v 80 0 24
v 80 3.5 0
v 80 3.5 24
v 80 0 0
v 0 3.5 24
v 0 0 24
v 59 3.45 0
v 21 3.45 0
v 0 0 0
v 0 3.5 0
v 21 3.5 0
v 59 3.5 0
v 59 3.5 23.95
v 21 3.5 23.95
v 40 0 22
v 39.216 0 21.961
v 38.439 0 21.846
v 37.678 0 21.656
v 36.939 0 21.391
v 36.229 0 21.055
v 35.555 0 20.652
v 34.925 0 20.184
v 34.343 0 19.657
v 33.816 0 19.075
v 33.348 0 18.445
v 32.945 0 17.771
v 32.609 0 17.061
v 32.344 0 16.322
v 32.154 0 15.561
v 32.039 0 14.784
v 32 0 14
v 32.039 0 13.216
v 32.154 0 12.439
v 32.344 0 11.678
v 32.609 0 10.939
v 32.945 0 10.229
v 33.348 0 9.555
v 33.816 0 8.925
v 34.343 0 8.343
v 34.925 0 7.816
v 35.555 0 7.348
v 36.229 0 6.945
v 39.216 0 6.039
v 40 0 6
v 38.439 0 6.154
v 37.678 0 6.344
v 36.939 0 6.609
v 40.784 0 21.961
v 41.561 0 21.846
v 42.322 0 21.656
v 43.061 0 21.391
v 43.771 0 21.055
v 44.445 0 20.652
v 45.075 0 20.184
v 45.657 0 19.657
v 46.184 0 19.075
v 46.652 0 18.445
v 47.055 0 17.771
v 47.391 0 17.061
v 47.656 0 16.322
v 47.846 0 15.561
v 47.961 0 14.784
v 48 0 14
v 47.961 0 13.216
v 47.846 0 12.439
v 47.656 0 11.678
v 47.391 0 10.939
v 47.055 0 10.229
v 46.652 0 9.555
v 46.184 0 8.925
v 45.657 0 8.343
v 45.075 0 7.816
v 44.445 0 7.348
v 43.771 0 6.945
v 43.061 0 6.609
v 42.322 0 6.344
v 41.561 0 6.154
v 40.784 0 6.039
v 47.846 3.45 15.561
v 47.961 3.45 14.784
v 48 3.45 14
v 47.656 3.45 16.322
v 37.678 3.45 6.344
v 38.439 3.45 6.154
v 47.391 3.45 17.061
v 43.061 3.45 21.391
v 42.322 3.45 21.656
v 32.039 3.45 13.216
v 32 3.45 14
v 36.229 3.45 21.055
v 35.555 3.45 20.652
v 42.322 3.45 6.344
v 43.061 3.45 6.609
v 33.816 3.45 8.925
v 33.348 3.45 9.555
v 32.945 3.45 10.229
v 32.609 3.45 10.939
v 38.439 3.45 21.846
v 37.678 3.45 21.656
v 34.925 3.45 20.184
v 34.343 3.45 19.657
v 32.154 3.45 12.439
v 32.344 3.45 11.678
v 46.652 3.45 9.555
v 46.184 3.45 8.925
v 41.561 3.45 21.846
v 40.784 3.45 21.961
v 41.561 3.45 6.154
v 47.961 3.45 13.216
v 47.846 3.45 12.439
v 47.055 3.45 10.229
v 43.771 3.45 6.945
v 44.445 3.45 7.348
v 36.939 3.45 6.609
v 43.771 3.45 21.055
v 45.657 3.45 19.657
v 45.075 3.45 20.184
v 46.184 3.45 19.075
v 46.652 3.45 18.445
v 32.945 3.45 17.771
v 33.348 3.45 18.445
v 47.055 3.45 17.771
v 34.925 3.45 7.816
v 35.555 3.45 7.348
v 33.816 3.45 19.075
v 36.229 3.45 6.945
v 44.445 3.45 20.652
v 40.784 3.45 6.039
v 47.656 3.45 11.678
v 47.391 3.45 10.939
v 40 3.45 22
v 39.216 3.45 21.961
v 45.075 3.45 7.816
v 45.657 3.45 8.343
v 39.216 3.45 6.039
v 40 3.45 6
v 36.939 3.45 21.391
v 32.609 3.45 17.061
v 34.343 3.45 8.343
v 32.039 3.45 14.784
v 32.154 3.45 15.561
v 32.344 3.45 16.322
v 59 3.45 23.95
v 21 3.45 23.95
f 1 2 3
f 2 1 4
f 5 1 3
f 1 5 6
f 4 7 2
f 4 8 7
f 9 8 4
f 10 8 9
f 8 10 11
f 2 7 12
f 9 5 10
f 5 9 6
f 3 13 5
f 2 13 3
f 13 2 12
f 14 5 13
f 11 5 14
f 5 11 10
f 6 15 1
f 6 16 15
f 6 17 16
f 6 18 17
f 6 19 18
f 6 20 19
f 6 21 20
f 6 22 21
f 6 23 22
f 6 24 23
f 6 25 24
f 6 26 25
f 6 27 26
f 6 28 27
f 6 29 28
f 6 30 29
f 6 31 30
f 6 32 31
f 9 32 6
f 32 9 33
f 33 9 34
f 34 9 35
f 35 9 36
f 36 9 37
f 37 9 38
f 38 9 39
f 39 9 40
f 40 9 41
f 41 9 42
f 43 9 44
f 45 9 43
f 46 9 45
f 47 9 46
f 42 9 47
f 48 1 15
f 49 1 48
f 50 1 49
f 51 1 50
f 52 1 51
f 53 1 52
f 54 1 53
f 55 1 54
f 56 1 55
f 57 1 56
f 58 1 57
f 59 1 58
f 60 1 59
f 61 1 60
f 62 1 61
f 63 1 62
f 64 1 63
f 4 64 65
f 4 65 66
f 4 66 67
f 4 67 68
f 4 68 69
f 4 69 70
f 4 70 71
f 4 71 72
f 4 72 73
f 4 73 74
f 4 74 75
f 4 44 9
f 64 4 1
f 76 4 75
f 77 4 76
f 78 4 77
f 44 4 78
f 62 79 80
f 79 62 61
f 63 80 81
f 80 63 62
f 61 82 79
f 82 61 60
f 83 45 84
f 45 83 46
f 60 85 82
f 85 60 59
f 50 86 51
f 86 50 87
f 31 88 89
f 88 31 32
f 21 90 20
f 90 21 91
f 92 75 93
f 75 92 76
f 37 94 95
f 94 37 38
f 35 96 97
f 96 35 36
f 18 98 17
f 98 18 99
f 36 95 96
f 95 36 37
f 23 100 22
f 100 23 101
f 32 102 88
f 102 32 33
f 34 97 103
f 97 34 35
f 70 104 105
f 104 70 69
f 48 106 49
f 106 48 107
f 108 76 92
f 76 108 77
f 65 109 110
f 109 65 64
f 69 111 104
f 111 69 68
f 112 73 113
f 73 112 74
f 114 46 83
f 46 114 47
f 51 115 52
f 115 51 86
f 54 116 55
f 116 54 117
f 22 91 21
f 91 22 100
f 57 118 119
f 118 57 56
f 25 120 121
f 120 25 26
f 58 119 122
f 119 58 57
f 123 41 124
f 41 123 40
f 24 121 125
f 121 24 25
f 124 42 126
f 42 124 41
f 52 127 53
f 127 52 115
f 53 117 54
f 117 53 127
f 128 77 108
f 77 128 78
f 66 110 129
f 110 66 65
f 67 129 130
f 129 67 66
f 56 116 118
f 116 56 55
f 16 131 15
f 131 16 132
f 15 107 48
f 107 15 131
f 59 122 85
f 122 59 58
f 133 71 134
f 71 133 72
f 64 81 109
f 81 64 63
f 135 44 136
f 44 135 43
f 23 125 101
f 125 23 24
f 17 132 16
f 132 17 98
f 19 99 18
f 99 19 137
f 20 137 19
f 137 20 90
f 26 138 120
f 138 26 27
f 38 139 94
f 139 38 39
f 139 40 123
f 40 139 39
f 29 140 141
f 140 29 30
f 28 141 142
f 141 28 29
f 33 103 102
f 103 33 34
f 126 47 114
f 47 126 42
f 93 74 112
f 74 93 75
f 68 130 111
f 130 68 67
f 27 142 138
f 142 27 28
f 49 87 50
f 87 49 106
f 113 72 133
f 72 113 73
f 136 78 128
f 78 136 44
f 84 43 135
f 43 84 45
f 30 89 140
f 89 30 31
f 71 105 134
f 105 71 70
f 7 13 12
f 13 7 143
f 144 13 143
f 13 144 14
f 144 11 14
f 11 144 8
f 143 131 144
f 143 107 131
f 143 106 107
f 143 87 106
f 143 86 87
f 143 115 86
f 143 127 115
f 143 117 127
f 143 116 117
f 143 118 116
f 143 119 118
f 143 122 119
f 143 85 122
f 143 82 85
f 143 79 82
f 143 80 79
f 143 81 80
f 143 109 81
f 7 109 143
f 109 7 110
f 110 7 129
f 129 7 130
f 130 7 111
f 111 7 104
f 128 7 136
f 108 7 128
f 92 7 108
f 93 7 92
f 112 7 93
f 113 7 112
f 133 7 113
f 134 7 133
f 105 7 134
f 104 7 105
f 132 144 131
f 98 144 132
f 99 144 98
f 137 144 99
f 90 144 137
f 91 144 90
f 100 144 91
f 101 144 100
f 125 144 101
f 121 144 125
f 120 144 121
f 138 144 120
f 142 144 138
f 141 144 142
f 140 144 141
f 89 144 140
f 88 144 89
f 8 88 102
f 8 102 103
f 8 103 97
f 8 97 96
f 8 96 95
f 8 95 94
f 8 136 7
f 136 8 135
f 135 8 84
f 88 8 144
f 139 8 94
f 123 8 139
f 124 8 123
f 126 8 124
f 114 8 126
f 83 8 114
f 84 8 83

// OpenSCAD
// Cable gland inner nut clearance pattern.
// Uses a real production relief cut plus preview-only hardware.

$fn = 64;

wall_thickness = 3.5;
wall_height = 20;
floor_thickness = 4;

hole_d = 16;
nut_d = 28;
nut_thickness = 5;
tool_clearance_d = 34;
relief_depth = 8;
relief_width = tool_clearance_d + 4;
center_x = 40;
center_z = floor_thickness + wall_height / 2;

show_preview = true;

module gland_hole_cut() {
    translate([center_x, wall_thickness / 2, center_z])
        rotate([90, 0, 0])
            cylinder(h = wall_thickness + 4, d = hole_d, center = true);
}

module inner_nut_relief_cut() {
    translate([
        center_x - relief_width / 2,
        wall_thickness - 0.05,
        0
    ])
        cube([
            relief_width,
            relief_depth + 0.1,
            floor_thickness + wall_height - 0.05
        ]);
}

module wall_with_gland_relief() {
    difference() {
        cube([80, wall_thickness, floor_thickness + wall_height]);
        gland_hole_cut();
        inner_nut_relief_cut();
    }
}

module preview_gland_hardware() {
    if (show_preview) {
        %color([1, 0.65, 0, 0.35])
            translate([center_x, wall_thickness, center_z])
                rotate([-90, 0, 0])
                    cylinder(h = nut_thickness, d = nut_d, $fn = 6);

        %color([1, 0, 0, 0.15])
            translate([center_x, wall_thickness, center_z])
                rotate([-90, 0, 0])
                    cylinder(h = relief_depth, d = tool_clearance_d);
    }
}

wall_with_gland_relief();
preview_gland_hardware();
